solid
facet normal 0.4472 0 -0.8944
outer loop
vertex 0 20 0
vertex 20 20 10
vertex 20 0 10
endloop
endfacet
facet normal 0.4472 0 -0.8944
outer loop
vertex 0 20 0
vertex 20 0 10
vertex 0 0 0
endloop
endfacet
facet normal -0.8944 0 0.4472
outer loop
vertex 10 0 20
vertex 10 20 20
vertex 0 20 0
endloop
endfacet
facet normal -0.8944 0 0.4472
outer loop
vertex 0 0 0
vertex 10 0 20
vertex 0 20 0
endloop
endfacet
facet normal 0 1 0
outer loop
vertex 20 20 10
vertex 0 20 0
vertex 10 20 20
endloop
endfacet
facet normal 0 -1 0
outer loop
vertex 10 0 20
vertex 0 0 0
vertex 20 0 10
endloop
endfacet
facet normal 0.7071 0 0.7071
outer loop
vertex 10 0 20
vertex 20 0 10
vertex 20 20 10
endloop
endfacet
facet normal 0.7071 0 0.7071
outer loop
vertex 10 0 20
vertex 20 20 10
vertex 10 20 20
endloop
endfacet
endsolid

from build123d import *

# Parameters (mm, degrees)
SKETCH1_W           = 20
SKETCH1_H           = 20
BOSS_EXTRUDE1_DEPTH = 20
CUT_EXTRUDE1_DEPTH  = 20
CUT_EXTRUDE2_DEPTH  = 20
CUT_EXTRUDE3_DEPTH  = 20


with BuildPart() as part:
    # Sketch1 → Boss-Extrude1 (new body)
    with BuildSketch(Plane.XY):
        with Locations((10, 10)):
            Rectangle(SKETCH1_W, SKETCH1_H)
    extrude(amount=BOSS_EXTRUDE1_DEPTH)

    # Sketch2 → Cut-Extrude1 (cut)
    with BuildSketch(Plane(origin=(0, 20, 0), x_dir=(1, 0, 0), z_dir=(0, 1, 0))):
        Polygon((0, 0), (20, 0), (20, -10), align=None)
    extrude(amount=-CUT_EXTRUDE1_DEPTH, mode=Mode.SUBTRACT)

    # Sketch3 → Cut-Extrude2 (cut)
    with BuildSketch(Plane(origin=(0, 20, 0), x_dir=(1, 0, 0), z_dir=(0, 1, 0))):
        Polygon((0, 0), (0, -20), (10, -20), align=None)
    extrude(amount=-CUT_EXTRUDE2_DEPTH, mode=Mode.SUBTRACT)

    # Sketch4 → Cut-Extrude3 (cut)
    with BuildSketch(Plane(origin=(0, 20, 0), x_dir=(1, 0, 0), z_dir=(0, 1, 0))):
        Polygon((20, -20), (20, -10), (10, -20), align=None)
    extrude(amount=-CUT_EXTRUDE3_DEPTH, mode=Mode.SUBTRACT)


solid = part.part
